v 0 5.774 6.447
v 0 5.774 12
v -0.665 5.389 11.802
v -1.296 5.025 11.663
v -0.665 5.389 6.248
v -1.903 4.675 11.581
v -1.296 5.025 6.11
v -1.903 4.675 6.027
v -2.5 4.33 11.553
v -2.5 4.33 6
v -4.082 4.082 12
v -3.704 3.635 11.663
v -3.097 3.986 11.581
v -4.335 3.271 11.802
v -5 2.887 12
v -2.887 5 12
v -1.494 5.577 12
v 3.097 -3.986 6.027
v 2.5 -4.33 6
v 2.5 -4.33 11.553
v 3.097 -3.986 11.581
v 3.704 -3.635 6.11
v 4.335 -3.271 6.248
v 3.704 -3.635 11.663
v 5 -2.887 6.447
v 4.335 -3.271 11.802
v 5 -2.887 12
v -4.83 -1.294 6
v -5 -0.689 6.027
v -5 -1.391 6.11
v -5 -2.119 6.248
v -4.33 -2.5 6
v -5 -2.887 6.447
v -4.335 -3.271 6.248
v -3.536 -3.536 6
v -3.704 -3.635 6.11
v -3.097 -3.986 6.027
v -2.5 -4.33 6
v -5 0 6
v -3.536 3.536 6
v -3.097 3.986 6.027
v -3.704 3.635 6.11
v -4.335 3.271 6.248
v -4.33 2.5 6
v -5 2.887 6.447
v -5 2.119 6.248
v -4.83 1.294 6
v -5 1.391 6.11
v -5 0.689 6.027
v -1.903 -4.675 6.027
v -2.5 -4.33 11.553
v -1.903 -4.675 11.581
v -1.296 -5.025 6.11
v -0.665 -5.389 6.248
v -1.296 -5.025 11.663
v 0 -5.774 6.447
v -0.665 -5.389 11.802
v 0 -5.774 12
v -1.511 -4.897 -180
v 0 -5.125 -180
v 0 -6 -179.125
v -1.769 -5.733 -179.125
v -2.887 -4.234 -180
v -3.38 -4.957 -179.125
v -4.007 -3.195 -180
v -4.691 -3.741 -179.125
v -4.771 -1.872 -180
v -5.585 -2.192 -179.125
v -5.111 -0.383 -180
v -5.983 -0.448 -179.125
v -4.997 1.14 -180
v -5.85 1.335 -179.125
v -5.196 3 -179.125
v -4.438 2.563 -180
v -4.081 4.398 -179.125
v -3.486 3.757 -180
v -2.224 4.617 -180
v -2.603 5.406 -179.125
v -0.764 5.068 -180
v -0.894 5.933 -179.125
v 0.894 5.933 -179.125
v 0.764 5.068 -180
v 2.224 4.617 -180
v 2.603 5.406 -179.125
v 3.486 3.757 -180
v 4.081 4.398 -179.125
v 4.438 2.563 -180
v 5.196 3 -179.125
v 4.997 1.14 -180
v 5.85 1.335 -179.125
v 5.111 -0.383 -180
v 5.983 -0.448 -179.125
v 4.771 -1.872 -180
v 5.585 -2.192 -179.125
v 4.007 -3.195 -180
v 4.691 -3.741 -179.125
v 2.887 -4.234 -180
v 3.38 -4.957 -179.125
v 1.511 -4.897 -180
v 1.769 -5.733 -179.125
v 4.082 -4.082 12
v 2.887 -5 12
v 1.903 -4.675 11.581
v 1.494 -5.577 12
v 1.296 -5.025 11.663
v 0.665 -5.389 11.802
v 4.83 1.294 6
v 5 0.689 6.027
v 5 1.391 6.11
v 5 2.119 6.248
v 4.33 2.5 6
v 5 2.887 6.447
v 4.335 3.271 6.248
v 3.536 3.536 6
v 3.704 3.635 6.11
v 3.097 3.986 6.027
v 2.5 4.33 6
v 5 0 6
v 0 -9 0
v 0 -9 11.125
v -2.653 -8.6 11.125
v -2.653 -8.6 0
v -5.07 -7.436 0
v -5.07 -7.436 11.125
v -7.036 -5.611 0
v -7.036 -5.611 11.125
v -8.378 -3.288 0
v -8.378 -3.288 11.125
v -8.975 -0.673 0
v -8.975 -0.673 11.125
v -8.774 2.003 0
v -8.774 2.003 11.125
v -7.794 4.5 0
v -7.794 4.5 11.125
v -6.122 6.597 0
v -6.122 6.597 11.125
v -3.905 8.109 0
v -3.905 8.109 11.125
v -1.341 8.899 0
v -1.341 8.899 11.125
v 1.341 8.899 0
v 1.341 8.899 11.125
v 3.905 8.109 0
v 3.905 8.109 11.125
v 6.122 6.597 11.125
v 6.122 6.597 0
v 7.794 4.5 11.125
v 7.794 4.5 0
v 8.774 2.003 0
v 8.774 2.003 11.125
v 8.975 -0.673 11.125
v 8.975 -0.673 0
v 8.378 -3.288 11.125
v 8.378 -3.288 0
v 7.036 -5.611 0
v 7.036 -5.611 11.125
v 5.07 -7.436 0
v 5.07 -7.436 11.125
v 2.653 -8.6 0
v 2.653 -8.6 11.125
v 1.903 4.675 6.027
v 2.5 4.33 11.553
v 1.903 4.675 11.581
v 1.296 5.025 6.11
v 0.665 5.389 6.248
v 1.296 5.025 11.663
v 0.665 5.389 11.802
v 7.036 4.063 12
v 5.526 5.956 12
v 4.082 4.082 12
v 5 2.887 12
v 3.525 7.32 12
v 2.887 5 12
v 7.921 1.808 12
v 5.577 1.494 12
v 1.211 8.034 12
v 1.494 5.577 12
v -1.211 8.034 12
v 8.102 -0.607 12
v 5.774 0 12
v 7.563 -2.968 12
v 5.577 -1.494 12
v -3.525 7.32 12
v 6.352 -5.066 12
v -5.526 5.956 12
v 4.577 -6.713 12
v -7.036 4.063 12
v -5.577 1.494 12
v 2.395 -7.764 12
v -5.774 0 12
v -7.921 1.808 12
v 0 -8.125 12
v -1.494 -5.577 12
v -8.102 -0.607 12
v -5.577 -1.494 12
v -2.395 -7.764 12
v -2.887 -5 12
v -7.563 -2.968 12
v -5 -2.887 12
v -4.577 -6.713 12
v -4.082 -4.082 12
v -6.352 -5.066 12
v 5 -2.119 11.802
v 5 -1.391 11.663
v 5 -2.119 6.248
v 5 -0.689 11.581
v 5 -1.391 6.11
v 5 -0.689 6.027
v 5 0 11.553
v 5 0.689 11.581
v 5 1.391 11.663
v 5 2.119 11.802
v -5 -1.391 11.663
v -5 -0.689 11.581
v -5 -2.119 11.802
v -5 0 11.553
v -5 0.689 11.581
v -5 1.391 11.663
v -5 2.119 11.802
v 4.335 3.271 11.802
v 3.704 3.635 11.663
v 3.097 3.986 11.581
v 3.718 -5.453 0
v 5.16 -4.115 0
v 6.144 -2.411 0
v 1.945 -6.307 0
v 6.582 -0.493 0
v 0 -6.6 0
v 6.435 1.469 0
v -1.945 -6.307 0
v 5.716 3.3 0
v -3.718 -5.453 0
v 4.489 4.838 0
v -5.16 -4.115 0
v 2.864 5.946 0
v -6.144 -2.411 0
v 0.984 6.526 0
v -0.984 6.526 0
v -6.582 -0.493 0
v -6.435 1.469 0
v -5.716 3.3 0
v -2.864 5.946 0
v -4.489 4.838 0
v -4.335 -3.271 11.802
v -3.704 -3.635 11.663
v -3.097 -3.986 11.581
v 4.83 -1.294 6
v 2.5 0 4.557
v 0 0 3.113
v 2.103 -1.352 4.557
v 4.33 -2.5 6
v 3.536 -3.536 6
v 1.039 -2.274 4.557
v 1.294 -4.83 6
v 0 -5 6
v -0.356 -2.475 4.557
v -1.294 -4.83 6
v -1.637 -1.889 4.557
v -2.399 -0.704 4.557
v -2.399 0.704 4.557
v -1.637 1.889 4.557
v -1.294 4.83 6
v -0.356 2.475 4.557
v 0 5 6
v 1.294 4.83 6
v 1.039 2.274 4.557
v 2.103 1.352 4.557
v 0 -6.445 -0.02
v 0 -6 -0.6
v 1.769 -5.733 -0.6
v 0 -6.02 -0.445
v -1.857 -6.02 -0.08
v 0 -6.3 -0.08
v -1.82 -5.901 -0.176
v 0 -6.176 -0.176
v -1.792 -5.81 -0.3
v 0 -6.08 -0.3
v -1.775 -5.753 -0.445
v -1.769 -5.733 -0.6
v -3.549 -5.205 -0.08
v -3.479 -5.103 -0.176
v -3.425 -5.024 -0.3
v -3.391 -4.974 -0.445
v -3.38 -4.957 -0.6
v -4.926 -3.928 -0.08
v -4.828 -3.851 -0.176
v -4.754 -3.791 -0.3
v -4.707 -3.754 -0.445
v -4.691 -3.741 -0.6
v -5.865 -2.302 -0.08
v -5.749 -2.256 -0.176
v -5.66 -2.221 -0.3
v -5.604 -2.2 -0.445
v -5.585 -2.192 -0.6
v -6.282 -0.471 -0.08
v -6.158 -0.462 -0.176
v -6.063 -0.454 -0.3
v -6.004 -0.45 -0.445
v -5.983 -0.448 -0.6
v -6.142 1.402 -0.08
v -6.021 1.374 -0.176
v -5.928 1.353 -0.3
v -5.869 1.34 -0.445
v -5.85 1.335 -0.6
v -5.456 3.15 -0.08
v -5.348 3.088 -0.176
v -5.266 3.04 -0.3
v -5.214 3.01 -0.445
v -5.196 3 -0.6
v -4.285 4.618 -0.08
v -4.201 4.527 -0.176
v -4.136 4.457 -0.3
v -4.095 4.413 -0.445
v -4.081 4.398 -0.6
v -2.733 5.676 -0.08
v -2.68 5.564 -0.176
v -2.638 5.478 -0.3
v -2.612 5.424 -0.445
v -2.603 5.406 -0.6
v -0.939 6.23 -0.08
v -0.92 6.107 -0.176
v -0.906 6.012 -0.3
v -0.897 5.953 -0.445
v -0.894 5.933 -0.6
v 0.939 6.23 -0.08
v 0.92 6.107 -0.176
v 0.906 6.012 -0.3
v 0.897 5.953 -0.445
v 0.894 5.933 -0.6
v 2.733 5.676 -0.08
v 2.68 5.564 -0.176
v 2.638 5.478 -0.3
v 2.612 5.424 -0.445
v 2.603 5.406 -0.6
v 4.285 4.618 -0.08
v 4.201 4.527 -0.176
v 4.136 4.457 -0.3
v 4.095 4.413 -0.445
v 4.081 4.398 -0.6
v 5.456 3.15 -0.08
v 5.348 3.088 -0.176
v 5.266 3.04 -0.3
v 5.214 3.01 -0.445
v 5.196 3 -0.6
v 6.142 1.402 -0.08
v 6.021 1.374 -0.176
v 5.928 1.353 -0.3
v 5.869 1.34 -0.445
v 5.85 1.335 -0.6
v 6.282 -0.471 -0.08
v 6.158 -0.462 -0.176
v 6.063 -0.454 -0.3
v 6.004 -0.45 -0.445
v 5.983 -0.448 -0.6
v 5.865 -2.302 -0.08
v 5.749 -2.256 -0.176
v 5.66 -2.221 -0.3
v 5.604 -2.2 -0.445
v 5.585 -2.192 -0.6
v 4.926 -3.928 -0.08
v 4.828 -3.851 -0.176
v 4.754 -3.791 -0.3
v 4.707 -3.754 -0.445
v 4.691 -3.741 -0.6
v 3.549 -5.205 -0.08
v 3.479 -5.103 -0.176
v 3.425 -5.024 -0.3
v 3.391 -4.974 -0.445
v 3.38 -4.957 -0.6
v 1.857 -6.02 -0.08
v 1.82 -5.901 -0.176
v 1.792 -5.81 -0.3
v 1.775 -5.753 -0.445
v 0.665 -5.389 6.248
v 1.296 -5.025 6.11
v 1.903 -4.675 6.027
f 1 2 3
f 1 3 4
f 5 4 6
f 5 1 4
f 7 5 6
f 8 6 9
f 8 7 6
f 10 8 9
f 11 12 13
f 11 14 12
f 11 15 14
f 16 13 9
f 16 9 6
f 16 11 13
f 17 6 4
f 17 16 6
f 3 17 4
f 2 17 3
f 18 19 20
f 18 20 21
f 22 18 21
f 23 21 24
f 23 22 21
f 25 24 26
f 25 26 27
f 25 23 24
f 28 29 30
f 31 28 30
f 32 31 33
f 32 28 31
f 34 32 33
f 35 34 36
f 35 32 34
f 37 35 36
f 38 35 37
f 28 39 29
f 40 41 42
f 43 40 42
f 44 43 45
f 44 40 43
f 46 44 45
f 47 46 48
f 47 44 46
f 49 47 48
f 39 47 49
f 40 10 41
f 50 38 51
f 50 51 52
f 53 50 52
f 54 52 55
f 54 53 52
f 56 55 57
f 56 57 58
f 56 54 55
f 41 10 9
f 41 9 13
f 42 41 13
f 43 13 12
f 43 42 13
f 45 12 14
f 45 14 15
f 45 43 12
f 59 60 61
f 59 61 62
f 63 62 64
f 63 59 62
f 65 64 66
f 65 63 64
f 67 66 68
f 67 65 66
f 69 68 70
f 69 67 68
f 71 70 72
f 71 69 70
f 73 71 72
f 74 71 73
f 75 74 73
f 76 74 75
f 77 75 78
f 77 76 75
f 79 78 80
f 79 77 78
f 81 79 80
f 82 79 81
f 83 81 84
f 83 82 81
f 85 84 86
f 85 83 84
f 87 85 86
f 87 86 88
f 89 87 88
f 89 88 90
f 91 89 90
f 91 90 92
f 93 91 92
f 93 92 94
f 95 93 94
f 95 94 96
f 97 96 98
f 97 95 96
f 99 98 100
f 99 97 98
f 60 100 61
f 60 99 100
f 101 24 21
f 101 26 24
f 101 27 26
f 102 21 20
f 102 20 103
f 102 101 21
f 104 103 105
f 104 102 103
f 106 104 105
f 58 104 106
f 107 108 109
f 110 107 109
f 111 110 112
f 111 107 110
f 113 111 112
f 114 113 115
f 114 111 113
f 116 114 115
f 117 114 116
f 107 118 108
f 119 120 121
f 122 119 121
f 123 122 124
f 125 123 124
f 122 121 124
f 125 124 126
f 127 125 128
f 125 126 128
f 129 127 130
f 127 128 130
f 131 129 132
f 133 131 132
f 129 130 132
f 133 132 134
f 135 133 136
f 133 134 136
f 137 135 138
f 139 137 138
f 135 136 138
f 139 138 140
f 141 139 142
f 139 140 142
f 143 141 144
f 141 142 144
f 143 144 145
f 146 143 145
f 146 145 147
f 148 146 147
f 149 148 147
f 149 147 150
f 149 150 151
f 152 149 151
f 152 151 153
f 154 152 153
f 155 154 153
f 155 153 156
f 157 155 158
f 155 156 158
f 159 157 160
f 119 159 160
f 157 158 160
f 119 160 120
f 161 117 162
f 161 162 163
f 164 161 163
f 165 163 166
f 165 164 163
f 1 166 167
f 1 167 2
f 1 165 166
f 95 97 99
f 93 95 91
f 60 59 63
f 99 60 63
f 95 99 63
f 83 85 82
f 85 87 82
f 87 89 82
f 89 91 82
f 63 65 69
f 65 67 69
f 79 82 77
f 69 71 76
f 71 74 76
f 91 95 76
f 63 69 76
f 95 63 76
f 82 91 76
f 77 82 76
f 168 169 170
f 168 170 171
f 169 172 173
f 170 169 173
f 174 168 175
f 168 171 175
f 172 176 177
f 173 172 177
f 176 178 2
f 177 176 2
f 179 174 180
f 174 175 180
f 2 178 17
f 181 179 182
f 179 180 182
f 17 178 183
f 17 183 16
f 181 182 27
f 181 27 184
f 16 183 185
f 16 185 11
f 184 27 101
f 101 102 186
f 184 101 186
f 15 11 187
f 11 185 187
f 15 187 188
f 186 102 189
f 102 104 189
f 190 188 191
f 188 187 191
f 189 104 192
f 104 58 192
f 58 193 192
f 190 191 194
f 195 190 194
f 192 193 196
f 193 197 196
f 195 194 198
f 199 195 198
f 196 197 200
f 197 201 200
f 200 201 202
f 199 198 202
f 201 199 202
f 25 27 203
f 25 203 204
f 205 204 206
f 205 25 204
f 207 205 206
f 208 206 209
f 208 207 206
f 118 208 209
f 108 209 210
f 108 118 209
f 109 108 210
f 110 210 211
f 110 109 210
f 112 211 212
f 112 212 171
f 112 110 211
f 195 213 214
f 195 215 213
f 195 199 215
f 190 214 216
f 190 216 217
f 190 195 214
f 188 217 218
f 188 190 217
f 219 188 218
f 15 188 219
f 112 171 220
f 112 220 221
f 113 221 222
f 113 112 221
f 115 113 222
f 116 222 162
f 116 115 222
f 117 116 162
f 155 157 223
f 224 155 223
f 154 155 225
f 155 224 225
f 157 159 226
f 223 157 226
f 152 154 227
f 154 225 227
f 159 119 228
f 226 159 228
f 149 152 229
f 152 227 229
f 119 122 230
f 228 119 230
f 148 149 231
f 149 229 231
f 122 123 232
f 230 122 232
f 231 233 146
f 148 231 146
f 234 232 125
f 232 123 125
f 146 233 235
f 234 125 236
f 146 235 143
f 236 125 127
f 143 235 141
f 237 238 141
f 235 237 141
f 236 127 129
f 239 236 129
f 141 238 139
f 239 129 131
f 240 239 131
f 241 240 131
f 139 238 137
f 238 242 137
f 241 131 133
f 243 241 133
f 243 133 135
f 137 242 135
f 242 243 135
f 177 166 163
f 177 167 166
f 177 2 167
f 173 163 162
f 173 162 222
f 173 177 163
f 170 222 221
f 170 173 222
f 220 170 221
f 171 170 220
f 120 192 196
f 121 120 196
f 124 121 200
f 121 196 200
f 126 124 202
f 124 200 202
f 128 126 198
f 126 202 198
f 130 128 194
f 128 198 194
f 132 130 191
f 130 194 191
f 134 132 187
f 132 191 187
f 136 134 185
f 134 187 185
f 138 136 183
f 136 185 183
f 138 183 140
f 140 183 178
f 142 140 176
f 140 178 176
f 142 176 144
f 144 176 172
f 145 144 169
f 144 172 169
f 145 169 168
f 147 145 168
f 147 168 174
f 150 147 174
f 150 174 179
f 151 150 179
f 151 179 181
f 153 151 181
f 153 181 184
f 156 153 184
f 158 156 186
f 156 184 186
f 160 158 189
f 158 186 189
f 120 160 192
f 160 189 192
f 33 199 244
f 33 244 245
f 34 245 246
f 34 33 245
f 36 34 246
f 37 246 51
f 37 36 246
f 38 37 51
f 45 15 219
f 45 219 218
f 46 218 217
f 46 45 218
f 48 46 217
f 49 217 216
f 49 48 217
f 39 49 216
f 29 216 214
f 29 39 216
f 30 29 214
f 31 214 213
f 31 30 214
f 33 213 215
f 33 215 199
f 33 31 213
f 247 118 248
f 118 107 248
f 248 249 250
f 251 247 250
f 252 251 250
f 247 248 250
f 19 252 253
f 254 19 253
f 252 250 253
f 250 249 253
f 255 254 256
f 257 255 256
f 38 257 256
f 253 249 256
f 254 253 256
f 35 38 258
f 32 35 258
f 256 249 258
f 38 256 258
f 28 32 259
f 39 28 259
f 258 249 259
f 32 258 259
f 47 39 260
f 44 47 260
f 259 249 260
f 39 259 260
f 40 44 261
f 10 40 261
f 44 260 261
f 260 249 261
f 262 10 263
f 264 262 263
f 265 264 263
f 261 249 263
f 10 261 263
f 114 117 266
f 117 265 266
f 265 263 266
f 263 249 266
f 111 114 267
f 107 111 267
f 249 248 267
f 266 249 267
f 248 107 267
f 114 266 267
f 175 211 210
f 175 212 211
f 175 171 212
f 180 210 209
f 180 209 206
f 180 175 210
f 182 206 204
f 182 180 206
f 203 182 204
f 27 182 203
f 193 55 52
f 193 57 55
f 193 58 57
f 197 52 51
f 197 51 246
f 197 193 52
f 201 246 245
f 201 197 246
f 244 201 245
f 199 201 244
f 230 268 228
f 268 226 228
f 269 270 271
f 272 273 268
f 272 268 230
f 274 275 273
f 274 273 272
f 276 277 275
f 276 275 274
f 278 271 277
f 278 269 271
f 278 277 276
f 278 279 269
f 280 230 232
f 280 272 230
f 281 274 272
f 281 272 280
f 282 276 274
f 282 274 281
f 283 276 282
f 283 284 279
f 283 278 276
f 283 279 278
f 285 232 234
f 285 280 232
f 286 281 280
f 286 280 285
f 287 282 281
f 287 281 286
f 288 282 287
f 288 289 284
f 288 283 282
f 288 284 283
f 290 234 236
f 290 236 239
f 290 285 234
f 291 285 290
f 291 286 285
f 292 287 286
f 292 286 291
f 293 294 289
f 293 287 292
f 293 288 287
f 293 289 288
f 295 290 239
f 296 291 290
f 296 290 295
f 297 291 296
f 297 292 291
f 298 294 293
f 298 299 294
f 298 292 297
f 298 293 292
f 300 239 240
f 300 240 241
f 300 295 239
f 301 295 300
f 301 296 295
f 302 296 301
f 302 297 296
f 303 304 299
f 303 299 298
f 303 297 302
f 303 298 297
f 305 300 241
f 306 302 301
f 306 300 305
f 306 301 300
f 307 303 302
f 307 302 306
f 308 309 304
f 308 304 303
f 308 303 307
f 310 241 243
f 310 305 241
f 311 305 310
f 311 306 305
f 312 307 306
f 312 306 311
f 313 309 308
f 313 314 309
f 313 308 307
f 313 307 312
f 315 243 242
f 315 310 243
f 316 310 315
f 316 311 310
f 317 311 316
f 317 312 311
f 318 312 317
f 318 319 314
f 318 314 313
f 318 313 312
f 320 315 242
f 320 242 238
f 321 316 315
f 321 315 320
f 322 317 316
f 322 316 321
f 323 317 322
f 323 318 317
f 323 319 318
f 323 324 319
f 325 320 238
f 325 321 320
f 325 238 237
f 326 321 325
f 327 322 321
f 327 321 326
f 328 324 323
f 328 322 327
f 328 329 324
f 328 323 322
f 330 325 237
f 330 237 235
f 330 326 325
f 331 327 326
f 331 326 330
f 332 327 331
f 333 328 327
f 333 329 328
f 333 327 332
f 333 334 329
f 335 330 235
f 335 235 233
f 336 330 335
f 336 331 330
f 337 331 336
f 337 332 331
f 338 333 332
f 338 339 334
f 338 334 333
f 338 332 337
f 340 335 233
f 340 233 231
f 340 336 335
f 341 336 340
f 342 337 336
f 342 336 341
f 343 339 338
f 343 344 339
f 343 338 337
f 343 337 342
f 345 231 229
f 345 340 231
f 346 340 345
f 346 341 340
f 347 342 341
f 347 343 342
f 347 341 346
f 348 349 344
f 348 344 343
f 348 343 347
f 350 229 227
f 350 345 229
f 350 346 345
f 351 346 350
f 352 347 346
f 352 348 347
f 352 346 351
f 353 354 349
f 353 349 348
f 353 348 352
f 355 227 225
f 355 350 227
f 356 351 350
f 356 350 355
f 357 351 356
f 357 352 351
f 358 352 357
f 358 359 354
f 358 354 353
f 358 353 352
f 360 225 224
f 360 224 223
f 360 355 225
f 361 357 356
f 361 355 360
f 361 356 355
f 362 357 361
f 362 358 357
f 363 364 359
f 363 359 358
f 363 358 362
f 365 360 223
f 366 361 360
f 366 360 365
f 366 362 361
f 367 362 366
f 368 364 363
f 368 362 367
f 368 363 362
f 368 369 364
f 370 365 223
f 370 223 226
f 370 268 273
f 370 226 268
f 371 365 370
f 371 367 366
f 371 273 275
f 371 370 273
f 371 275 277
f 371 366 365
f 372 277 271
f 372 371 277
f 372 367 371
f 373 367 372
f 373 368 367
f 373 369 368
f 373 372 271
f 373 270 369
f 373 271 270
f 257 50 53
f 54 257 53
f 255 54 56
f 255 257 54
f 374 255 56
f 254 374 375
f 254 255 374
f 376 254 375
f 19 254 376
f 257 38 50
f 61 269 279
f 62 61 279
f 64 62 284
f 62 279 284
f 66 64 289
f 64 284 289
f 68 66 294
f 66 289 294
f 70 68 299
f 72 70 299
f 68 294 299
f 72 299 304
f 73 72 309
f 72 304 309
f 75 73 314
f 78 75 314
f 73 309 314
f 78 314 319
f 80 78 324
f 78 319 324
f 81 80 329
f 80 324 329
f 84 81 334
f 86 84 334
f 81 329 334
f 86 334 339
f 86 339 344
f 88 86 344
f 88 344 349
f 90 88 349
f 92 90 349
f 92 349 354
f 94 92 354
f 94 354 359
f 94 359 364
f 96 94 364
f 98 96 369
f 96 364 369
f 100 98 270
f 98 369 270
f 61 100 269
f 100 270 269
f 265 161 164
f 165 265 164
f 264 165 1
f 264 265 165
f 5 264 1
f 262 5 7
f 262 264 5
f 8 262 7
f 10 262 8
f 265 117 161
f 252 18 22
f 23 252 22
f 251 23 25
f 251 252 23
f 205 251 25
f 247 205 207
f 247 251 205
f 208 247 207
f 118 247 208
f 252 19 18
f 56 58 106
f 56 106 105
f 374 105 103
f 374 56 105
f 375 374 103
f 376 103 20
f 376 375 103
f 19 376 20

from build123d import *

# Parameters (mm, degrees)
CHAMFER1_SIZE      = 0.875
CUT_EXTRUDE1_REACH = 194.421
FILLET2_R          = 0.6


with BuildPart() as part:
    # Sketch1 → Revolve1 (revolve)
    with BuildSketch(Plane(origin=(0, 0, 0), x_dir=(0, 0, -1), z_dir=(1, 0, 0))):
        Polygon((0, 9), (-12, 9), (-12, 0), (180, 0), (180, 6), (0, 6), align=None)
    revolve(axis=Axis((0, 0, 12), (0, 0, -1)))

    # Sketch7 → Cut-Revolve2 (revolve, cut)
    with BuildSketch(Plane(origin=(0, 0, 0), x_dir=(0, 0, -1), z_dir=(1, 0, 0))):
        Polygon((-12, 0), (-12, 5), (-6, 5), (-3.113248654, 0), align=None)
    revolve(axis=Axis((0, 0, 12), (0, 0, -1)), mode=Mode.SUBTRACT)

    # Chamfer1
    chamfer1_edges = [part.edges().sort_by_distance(p)[0] for p in [
        (0, -6, -180),
        (0, -9, 12),
    ]]
    chamfer(chamfer1_edges, length=CHAMFER1_SIZE)

    # Cut-Extrude1: up to this cone (the profile starts inside it)
    cut_extrude1_end = Plane(origin=(0, 0, 12), z_dir=(0, 0, 1)).offset(-8.886750346) * Cone(1.732e-06, 379.665634345, 219.200055191, align=(Align.CENTER, Align.CENTER, Align.MIN), mode=Mode.PRIVATE)
    # Sketch8 → Cut-Extrude1 (cut, up to the surface)
    with BuildSketch(Plane.XY.offset(12), mode=Mode.PRIVATE) as cut_extrude1_sk1:
        Polygon((0, 5.773502692), (-5, 2.886751346), (-5, -2.886751346), (0, -5.773502692), (5, -2.886751346), (5, 2.886751346), align=None)
    cut_extrude1_tool1 = extrude(cut_extrude1_sk1.sketch, amount=-CUT_EXTRUDE1_REACH, mode=Mode.PRIVATE) & cut_extrude1_end
    add(cut_extrude1_tool1.solids().sort_by_distance((0, 0, 12))[0], mode=Mode.SUBTRACT)

    # Sketch9 → Cut-Revolve3 (revolve, cut)
    with BuildSketch(Plane(origin=(0, 0, 0), x_dir=(0, 0, -1), z_dir=(1, 0, 0))):
        Polygon((-12.5, 6.639528096), (-12.5, 5), (-11.553418013, 5), align=None)
    revolve(axis=Axis((0, 0, 12), (0, 0, -1)), mode=Mode.SUBTRACT)

    # Fillet2
    fillet2_edges = [part.edges().sort_by_distance(p)[0] for p in [
        (0, -6, 0),
    ]]
    fillet(fillet2_edges, radius=FILLET2_R)


solid = part.part
